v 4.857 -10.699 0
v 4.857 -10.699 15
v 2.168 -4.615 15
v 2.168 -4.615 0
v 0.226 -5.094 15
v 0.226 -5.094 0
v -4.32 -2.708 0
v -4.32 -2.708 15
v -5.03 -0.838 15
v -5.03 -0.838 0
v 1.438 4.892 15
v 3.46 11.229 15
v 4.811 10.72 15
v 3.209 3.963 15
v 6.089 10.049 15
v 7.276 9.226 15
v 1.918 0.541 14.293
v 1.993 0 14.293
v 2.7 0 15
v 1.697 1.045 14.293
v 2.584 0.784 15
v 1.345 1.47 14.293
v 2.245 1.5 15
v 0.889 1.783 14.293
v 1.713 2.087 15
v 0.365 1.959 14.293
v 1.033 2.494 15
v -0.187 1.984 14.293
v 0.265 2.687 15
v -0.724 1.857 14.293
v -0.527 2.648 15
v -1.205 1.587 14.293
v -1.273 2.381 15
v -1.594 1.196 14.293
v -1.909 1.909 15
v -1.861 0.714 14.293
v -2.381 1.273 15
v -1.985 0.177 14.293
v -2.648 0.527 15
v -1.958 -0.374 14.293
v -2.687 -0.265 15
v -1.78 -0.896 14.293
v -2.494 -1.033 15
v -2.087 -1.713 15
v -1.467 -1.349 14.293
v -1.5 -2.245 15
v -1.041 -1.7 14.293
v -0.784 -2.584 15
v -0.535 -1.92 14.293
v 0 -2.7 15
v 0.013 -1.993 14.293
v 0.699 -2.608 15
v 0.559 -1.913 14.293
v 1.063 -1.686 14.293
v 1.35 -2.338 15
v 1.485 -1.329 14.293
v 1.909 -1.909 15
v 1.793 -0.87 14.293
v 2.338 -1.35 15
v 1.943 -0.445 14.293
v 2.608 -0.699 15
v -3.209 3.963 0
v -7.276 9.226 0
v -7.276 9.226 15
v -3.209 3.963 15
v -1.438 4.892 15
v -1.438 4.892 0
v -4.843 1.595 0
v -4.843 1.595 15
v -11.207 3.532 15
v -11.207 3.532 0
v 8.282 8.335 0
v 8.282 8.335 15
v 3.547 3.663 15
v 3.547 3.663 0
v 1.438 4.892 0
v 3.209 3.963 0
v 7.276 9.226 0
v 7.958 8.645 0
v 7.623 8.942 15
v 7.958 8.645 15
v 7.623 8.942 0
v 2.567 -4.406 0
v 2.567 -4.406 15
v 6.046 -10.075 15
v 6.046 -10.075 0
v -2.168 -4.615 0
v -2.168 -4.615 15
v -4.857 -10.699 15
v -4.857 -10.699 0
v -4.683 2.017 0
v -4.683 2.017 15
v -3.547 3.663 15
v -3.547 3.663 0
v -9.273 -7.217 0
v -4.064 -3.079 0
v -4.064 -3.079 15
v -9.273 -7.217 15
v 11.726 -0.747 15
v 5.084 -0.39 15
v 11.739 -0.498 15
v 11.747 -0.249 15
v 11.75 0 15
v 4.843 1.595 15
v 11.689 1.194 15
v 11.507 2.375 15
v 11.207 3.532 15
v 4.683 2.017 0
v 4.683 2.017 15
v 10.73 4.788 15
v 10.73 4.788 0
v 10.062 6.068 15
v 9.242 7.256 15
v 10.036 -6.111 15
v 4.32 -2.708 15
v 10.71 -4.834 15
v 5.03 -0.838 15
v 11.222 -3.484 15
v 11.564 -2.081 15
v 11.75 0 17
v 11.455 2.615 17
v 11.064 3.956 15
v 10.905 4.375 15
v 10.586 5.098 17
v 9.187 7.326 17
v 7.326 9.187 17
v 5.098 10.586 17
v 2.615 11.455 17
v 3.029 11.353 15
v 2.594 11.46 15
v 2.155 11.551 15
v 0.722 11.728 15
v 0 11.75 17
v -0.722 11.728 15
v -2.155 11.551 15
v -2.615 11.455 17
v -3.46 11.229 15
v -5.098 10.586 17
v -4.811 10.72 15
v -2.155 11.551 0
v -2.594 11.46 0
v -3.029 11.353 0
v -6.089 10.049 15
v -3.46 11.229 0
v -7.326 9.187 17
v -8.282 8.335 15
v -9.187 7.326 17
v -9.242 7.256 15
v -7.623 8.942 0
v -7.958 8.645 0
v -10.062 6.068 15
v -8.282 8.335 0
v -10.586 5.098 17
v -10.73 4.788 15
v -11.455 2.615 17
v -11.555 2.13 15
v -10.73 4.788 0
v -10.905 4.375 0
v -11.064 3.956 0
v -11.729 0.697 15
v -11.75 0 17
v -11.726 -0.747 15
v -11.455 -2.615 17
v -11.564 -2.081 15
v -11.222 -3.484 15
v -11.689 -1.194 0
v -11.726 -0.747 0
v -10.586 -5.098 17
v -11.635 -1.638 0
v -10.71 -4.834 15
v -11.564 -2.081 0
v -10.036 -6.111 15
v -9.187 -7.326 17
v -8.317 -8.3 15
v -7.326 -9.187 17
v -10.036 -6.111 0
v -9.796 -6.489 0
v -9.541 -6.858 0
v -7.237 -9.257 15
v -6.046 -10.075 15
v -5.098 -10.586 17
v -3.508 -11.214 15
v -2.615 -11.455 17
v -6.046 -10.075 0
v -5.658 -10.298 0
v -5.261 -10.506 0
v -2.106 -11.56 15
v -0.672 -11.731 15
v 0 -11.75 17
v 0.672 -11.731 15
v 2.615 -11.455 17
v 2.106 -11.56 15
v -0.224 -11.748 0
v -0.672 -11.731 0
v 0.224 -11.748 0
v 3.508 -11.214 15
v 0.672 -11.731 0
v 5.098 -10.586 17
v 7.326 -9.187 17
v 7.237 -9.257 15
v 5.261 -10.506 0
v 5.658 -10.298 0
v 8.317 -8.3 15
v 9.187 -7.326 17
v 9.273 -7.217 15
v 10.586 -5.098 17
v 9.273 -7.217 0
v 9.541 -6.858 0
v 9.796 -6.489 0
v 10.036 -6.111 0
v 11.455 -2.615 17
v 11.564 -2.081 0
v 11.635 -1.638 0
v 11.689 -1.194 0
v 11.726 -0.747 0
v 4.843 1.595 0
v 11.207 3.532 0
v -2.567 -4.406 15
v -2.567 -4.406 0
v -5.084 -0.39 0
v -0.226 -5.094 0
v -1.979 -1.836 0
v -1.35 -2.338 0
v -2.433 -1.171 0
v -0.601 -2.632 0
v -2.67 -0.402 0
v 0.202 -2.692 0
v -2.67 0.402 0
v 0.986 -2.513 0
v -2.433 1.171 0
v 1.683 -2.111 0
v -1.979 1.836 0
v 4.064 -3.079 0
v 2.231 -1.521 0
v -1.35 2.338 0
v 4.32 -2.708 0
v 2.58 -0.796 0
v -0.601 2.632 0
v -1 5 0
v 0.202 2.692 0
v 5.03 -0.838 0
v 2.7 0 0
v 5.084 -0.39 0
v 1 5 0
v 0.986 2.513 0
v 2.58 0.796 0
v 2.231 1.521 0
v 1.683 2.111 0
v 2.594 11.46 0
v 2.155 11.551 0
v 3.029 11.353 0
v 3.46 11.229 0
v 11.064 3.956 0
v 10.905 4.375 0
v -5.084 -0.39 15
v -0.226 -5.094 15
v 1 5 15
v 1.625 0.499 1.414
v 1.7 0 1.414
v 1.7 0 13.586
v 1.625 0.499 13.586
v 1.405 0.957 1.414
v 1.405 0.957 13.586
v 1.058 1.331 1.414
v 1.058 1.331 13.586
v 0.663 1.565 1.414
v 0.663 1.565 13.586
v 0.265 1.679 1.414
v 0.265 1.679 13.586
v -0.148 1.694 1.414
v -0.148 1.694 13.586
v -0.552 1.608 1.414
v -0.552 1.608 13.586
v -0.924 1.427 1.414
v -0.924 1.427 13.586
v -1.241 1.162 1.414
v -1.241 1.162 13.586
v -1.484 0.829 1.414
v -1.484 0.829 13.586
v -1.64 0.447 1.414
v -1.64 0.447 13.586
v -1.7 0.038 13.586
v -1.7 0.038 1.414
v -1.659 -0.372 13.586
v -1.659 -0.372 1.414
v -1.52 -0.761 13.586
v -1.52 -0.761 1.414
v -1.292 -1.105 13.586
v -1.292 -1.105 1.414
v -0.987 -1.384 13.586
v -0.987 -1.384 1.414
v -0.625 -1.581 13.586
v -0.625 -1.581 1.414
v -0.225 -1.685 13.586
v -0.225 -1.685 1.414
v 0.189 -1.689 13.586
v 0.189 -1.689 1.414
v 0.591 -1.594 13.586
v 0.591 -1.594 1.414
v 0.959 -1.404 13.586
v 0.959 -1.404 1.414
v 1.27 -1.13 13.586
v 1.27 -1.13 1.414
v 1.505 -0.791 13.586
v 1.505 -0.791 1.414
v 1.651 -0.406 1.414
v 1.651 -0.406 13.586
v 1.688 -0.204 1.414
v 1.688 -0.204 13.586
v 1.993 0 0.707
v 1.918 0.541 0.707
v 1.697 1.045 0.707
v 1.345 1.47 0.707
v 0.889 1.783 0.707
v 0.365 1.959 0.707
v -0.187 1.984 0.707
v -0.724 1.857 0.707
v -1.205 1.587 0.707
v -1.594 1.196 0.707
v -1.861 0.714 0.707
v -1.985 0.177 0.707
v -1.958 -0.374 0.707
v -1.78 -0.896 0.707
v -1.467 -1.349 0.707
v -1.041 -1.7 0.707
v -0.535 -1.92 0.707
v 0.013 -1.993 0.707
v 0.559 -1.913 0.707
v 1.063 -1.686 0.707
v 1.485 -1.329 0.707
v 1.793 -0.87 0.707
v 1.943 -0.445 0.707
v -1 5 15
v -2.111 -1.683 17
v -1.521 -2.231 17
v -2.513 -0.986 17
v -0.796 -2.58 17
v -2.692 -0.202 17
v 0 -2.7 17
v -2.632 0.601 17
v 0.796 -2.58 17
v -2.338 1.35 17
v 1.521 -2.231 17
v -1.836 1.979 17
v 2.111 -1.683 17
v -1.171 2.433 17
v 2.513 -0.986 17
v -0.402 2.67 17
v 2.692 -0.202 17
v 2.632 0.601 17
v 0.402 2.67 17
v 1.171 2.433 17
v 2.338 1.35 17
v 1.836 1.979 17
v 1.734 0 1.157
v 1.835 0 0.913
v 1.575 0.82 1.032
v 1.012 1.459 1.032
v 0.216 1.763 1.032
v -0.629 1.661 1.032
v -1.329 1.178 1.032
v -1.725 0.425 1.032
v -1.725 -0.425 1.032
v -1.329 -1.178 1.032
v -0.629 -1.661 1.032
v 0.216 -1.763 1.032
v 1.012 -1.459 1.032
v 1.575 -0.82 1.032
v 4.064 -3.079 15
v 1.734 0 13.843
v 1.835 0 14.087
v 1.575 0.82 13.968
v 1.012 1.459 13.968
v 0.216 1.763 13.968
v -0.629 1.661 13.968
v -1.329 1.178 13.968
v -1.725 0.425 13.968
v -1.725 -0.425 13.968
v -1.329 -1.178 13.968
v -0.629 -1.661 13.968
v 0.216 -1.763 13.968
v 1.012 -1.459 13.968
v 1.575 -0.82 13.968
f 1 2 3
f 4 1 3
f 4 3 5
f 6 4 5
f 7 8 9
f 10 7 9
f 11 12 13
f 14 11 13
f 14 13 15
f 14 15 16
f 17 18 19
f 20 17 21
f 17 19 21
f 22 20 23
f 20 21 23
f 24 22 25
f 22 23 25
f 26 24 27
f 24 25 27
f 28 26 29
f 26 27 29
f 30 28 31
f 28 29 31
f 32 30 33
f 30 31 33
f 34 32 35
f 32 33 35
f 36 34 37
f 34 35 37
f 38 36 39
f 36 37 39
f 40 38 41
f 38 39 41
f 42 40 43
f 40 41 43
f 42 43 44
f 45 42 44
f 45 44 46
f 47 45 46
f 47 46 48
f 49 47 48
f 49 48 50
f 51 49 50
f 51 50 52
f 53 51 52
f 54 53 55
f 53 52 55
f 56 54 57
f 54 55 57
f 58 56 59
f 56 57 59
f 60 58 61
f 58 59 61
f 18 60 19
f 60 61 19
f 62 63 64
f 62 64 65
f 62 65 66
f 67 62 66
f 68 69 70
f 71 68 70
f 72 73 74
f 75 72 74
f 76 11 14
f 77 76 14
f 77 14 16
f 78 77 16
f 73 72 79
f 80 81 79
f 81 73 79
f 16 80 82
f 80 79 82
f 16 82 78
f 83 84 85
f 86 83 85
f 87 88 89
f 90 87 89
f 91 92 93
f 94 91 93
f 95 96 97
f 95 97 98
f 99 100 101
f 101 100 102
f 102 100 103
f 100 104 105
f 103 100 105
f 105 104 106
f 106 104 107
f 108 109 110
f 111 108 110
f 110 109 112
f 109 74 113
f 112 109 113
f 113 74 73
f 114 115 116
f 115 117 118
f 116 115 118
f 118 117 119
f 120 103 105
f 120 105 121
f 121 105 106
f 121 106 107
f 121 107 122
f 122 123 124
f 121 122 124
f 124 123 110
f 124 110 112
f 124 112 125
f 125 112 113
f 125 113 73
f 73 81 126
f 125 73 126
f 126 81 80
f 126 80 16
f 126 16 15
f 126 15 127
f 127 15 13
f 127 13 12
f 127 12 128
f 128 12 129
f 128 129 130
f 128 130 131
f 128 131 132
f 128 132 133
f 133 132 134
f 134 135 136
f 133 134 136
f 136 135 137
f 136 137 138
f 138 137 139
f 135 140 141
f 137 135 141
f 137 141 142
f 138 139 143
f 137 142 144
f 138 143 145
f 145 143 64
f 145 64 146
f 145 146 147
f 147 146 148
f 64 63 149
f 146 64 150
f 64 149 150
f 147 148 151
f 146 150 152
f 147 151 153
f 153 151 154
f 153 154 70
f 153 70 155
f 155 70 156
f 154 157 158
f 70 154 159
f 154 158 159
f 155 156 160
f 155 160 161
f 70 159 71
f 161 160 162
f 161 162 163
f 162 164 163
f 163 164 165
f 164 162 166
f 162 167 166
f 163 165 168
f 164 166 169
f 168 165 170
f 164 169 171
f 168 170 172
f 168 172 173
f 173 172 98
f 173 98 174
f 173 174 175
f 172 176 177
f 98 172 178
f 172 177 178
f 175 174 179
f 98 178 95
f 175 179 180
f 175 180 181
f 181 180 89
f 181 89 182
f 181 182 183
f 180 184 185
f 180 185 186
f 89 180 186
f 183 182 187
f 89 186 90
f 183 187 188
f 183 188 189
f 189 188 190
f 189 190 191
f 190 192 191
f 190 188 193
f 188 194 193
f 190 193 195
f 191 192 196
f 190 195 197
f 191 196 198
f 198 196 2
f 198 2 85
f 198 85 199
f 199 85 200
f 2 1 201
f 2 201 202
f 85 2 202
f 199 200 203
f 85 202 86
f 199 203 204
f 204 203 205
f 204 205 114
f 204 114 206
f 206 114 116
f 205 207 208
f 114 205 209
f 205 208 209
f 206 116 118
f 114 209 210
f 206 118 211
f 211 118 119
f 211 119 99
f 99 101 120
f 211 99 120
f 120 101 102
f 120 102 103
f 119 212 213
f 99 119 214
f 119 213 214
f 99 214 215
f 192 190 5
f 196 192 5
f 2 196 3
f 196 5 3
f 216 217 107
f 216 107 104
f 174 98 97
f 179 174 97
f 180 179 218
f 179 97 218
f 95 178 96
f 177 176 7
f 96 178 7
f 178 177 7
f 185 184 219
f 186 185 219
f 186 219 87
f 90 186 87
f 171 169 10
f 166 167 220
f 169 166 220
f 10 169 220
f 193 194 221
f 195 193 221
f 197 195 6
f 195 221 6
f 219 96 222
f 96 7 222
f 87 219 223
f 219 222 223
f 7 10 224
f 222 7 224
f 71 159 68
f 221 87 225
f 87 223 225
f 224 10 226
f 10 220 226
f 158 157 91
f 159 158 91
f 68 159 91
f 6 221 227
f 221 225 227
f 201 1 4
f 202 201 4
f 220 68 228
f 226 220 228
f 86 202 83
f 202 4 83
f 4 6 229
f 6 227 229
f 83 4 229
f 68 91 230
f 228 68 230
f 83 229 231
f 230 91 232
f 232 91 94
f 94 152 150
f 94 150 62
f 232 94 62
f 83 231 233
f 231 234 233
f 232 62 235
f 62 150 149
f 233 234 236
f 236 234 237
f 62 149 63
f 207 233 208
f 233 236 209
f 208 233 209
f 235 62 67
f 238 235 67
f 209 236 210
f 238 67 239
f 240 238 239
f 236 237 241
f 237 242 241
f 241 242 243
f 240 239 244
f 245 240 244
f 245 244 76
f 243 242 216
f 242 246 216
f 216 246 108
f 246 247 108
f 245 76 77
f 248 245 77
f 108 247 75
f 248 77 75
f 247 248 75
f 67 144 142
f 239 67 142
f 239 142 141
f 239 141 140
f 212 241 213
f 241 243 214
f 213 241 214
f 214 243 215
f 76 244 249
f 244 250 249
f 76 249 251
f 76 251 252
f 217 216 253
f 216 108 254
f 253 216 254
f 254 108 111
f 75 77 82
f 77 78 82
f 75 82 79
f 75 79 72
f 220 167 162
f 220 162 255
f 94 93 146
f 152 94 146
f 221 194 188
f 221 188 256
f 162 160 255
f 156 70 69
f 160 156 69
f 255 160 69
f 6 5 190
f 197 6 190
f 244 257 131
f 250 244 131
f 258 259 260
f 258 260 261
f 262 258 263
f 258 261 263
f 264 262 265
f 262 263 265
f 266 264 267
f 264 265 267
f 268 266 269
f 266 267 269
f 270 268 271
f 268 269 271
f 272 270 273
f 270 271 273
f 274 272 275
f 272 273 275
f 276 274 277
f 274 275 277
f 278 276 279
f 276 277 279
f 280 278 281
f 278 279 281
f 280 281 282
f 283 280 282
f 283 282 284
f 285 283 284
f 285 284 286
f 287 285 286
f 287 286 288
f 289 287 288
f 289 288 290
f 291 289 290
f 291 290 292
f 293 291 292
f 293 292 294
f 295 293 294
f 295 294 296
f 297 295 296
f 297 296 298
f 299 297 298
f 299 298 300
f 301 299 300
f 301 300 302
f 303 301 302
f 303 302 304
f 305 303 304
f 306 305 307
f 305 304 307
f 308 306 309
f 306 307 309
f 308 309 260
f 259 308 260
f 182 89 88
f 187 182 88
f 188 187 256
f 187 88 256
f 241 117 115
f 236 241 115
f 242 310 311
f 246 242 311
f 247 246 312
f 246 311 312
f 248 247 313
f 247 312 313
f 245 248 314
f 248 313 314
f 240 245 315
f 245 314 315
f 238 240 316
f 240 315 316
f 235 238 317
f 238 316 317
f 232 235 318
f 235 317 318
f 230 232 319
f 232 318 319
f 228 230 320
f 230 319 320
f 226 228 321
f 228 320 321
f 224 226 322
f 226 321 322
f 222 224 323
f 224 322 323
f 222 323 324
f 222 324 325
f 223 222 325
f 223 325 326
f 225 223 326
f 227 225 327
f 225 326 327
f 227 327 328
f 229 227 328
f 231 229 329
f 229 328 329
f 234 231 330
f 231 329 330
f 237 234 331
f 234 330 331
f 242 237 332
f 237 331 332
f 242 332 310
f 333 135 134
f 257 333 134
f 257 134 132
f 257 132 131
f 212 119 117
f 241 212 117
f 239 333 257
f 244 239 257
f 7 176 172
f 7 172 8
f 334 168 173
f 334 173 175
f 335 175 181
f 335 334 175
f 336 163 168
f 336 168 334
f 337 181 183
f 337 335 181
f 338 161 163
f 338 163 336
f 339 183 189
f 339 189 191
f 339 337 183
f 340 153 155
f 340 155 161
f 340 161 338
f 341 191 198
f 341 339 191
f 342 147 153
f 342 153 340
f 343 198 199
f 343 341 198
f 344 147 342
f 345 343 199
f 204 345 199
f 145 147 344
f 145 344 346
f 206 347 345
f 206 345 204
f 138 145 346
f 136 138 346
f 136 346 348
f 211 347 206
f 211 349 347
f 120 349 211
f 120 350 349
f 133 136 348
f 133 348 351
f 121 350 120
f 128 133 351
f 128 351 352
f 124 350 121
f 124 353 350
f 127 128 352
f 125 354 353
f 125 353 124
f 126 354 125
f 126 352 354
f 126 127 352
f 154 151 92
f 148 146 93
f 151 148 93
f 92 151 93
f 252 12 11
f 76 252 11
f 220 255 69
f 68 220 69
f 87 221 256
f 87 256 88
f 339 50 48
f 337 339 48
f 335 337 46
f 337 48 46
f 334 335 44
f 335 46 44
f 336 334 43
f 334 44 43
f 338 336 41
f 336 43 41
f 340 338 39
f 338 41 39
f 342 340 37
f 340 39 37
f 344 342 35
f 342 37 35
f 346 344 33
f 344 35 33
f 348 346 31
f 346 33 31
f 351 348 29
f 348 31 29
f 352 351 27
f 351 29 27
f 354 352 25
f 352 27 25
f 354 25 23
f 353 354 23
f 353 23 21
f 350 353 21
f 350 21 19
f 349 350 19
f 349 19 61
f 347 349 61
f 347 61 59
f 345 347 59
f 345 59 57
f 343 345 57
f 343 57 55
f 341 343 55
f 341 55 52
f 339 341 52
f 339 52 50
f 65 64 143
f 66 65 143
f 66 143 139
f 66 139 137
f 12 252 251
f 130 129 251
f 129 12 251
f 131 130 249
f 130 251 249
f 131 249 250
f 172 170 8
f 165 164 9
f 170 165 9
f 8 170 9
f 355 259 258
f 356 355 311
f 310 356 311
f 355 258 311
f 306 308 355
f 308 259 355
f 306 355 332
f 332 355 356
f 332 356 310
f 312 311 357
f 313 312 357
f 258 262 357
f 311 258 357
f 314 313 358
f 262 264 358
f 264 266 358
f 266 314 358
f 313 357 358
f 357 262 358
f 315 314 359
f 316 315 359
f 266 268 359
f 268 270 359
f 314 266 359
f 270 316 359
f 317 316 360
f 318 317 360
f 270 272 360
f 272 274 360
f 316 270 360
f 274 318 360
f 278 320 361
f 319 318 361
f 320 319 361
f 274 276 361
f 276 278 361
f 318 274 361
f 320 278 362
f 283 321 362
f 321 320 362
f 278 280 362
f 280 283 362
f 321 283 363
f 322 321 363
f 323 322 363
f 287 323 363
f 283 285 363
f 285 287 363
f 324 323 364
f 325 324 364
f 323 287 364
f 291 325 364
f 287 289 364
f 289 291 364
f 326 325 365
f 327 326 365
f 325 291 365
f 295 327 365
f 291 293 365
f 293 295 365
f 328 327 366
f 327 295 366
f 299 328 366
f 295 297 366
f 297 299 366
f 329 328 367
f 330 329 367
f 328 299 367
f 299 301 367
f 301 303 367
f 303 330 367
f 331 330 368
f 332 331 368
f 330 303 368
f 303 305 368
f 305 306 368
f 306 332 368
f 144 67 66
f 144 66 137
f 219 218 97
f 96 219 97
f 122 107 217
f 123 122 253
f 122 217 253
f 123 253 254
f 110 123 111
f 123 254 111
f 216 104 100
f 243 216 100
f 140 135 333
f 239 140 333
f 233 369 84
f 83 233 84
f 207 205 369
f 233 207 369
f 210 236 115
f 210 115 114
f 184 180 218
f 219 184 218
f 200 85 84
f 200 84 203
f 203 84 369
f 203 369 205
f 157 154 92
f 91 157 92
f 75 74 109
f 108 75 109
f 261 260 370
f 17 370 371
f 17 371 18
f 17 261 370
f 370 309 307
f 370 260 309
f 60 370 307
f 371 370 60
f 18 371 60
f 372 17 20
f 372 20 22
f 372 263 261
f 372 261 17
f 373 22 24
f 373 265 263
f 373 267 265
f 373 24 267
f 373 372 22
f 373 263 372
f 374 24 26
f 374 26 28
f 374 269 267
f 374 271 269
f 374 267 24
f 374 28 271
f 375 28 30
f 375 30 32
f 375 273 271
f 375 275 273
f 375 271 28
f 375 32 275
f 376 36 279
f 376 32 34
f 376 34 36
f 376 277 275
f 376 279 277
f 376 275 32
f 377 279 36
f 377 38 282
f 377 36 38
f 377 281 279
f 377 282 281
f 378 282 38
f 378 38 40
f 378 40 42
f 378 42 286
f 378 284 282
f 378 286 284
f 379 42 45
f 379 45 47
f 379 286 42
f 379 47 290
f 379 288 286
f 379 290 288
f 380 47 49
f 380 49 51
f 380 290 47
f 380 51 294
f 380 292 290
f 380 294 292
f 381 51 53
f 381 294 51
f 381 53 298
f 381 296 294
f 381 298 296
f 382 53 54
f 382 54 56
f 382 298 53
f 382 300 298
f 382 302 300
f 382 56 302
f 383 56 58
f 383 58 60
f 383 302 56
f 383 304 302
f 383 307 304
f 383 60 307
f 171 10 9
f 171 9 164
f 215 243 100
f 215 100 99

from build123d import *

# Parameters (mm, degrees)
SKETCH_R           = 11.75
PAD_DEPTH          = 15
SKETCH001_R        = 1.7
POCKET_DEPTH       = 15.001
POCKET001_DEPTH    = 87.925619
POLARPATTERN_COUNT = 13
CHAMFER_SIZE       = 1
CHAMFER001_SIZE    = 1
FILLET_R           = 1
FILLET001_R        = 1
SKETCH003_R        = 11.75
PAD001_DEPTH       = 2
PAD001_FACE6_R     = 2.7
POCKET002_DEPTH    = 5


with BuildPart() as part:
    # Sketch → Pad (new body)
    with BuildSketch(Plane.XY):
        Circle(SKETCH_R)
    extrude(amount=PAD_DEPTH)

    # Sketch001 (on Face3 of Pad) → Pocket (cut, through all)
    with BuildSketch(Plane.XY.offset(15)):
        Circle(SKETCH001_R)
    extrude(amount=-POCKET_DEPTH, mode=Mode.SUBTRACT)

    # Sketch002 (on Face3 of Pocket) → Pocket001 (cut, through all)
    with BuildSketch(Plane.XY.offset(15)):
        Polygon((-1, 5), (1, 5), (2.389189, 12.878461), (-2.389183, 12.878462), align=None)
    pocket001 = extrude(amount=-POCKET001_DEPTH, mode=Mode.SUBTRACT)

    # PolarPattern: Pocket001 ×13 about axis
    polarpattern_axis = Axis((0, 0, 15), (0, 0, 1))
    for i in range(1, POLARPATTERN_COUNT):
        add(pocket001.rotate(polarpattern_axis, i * 360 / POLARPATTERN_COUNT), mode=Mode.SUBTRACT)

    # Chamfer
    chamfer_edges = [part.edges().sort_by_distance(p)[0] for p in [
        (-1.7, 0, 0),
    ]]
    chamfer(chamfer_edges, length=CHAMFER_SIZE)

    # Chamfer001
    chamfer001_edges = [part.edges().sort_by_distance(p)[0] for p in [
        (-1.7, 0, 15),
    ]]
    chamfer(chamfer001_edges, length=CHAMFER001_SIZE)

    # Fillet
    fillet_edges = [part.edges().sort_by_distance(p)[0] for p in [
        (-1.7, 0, 1),
    ]]
    fillet(fillet_edges, radius=FILLET_R)

    # Fillet001
    fillet001_edges = [part.edges().sort_by_distance(p)[0] for p in [
        (-1.7, 0, 14),
    ]]
    fillet(fillet001_edges, radius=FILLET001_R)

    # Sketch003 (on Face55 of PolarPattern) → Pad001 (join)
    with BuildSketch(Plane.XY.offset(15)):
        Circle(SKETCH003_R)
    extrude(amount=PAD001_DEPTH)

    # Pad001 Face6 → Pocket002 (cut)
    with BuildSketch(Plane(origin=(0, 0, 15), x_dir=(0, -1, 0), z_dir=(0, 0, -1))):
        Circle(PAD001_FACE6_R)
    extrude(amount=-POCKET002_DEPTH, mode=Mode.SUBTRACT)


solid = part.part
